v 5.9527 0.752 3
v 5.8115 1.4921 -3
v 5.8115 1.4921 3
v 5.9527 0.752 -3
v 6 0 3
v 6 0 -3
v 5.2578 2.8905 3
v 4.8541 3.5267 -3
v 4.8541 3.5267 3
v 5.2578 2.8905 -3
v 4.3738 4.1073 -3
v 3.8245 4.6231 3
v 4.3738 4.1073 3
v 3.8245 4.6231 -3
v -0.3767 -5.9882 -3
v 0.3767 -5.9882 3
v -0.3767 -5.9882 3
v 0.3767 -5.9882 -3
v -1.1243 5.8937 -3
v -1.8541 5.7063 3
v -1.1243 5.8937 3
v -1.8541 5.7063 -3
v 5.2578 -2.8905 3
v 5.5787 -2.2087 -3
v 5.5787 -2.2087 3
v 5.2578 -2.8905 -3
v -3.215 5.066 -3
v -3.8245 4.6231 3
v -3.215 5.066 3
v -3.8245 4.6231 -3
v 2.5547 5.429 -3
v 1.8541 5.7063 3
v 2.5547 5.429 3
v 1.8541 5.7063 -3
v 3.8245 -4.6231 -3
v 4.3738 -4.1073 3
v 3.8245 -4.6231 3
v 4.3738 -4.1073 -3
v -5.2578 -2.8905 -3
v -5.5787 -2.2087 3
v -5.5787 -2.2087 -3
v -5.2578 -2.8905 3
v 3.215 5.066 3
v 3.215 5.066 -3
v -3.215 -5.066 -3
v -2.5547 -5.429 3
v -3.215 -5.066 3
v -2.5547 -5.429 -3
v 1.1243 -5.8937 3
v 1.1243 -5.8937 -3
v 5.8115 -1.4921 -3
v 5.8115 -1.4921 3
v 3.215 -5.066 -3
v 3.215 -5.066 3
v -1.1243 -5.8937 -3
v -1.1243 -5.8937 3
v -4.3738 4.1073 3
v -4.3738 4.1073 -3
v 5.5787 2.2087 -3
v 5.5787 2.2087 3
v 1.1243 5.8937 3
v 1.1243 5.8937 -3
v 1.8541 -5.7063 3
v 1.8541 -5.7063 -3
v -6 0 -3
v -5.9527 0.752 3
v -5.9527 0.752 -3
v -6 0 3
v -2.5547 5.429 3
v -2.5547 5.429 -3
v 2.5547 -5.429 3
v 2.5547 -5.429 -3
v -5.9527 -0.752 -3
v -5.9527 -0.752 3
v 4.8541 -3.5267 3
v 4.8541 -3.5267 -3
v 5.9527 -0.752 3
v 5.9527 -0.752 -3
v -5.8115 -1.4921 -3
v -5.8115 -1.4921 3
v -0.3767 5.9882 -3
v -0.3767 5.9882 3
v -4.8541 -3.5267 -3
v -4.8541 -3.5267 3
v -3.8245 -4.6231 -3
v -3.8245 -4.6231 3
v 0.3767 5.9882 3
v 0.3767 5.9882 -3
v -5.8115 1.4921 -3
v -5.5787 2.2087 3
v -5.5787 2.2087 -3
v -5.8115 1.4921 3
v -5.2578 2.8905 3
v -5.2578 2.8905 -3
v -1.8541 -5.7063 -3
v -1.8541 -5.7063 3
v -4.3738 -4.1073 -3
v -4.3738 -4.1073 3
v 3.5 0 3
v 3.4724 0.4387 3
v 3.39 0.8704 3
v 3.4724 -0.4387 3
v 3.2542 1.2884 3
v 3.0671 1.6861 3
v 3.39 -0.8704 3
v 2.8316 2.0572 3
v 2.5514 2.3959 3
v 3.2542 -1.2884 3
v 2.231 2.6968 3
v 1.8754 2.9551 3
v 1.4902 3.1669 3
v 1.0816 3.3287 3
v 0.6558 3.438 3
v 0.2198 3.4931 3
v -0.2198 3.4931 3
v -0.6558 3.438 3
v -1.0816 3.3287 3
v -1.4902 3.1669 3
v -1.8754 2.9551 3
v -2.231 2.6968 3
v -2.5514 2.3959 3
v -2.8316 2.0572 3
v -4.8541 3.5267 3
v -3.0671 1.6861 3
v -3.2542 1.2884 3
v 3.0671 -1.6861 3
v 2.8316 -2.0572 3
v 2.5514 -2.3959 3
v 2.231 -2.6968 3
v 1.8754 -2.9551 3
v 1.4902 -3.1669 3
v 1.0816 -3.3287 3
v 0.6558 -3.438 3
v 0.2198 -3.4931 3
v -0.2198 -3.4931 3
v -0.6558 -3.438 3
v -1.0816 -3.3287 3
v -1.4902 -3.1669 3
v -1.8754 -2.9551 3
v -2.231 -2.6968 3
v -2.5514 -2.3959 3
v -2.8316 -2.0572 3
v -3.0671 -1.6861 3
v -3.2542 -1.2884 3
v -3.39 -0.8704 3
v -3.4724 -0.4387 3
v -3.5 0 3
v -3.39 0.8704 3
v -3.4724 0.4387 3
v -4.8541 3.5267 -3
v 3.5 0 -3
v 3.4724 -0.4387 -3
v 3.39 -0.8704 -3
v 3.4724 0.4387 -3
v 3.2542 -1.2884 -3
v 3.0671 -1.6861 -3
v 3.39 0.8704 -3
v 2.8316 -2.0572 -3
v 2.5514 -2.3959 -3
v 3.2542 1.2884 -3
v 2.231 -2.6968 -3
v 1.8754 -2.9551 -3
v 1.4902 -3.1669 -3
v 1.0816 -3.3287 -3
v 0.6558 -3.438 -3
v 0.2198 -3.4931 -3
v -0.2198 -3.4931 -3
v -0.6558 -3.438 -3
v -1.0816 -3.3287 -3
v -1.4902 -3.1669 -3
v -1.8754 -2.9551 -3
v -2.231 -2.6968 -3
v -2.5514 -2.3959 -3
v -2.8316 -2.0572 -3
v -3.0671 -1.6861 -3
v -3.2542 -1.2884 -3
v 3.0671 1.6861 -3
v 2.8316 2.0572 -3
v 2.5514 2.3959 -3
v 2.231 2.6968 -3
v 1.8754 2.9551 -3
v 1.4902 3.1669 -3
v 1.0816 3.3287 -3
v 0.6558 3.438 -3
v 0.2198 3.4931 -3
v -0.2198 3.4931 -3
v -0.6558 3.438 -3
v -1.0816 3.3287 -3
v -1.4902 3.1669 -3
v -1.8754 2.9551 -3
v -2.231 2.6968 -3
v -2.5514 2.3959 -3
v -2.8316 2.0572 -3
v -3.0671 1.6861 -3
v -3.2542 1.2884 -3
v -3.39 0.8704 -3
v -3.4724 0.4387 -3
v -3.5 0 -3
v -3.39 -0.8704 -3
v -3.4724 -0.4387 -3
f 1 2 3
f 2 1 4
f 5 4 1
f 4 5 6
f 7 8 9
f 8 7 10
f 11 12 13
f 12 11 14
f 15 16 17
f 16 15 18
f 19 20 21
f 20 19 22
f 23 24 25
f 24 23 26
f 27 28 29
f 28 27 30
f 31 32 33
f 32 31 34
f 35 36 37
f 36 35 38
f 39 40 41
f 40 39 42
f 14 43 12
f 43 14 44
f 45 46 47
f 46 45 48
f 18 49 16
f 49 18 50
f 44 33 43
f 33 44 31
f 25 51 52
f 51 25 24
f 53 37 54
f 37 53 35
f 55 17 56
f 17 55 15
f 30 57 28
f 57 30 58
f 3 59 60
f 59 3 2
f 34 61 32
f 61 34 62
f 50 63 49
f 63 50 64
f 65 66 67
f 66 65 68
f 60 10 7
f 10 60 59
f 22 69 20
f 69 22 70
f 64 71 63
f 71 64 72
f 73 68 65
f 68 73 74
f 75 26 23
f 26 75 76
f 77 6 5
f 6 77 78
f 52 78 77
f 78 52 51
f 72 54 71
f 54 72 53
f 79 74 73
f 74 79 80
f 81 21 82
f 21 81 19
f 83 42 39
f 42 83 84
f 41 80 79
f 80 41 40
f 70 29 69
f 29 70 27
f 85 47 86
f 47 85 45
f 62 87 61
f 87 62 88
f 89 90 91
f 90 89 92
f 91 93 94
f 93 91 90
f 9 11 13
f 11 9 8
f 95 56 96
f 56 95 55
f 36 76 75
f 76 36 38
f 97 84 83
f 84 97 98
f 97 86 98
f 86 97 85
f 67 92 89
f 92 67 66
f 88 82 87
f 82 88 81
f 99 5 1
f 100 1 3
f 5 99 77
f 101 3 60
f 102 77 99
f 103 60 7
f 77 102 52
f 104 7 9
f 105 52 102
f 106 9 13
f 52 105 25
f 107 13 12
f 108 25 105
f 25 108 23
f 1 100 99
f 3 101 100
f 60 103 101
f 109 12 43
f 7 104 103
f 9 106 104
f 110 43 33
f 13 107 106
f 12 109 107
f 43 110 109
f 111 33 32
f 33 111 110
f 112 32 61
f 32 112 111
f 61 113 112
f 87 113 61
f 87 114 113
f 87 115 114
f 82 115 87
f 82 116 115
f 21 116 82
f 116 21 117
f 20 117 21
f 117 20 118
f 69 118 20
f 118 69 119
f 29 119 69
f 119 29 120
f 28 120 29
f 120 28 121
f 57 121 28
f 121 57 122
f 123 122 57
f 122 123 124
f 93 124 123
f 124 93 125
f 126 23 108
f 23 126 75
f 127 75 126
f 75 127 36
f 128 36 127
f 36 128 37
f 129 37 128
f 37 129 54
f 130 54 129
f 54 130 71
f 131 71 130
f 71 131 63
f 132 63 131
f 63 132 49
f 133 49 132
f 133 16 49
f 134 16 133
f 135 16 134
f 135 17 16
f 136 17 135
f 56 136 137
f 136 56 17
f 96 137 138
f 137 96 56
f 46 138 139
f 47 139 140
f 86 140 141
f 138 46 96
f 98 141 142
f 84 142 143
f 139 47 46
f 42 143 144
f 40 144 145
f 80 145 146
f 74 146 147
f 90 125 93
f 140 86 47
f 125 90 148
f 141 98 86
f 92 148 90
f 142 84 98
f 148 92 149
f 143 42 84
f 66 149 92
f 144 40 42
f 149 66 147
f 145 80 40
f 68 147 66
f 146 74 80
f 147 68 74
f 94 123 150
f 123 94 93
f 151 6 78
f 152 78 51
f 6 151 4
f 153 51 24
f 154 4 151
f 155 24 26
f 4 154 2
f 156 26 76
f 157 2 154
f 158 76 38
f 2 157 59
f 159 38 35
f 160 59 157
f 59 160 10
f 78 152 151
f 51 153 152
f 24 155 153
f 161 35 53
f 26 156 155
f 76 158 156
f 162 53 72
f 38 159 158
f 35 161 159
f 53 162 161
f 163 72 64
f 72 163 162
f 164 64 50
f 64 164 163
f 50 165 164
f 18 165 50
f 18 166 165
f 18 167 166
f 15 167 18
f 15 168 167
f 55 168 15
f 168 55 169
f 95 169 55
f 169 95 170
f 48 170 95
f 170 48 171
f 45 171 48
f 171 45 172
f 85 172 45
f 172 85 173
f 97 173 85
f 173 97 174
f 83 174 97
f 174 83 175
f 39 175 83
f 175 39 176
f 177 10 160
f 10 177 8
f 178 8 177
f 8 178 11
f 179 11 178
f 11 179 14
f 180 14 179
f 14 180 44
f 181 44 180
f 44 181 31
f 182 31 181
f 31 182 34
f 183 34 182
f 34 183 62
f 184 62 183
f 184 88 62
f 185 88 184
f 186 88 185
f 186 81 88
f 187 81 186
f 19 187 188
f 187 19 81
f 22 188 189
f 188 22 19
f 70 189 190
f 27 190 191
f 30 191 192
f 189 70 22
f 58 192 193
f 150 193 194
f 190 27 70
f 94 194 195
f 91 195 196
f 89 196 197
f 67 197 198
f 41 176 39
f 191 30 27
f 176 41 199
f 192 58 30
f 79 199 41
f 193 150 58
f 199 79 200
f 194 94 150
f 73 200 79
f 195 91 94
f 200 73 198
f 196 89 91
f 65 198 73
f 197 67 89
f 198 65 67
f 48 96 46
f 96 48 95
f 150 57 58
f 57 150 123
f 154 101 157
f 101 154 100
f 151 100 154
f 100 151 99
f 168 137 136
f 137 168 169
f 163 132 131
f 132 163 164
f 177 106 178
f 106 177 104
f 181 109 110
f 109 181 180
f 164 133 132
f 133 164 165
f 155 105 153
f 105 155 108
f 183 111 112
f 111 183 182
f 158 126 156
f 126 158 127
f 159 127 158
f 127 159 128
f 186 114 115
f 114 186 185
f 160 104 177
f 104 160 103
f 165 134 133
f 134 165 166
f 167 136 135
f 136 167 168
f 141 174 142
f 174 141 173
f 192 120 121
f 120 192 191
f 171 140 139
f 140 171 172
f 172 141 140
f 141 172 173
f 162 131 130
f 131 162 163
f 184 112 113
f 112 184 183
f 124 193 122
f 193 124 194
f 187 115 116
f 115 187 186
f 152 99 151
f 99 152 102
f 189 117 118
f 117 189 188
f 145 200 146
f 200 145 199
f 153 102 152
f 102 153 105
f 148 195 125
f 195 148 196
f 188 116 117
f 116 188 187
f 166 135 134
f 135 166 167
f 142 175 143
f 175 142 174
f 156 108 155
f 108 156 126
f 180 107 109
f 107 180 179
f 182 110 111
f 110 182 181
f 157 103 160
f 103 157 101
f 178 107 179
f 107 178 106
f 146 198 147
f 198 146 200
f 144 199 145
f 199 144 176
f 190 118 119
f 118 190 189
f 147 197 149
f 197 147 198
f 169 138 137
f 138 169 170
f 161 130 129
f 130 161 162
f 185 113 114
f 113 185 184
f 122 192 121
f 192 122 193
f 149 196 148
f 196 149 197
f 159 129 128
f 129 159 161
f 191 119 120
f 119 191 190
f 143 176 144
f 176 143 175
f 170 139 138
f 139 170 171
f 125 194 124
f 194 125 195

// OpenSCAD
$fn = 50;


difference() {
	union() {
		translate(v = [0, 0, -3.0000000000]) {
			cylinder(h = 6, r = 6.0000000000);
		}
	}
	union() {
		translate(v = [0, 0, -100.0000000000]) {
			cylinder(h = 200, r = 3.5000000000);
		}
	}
}
